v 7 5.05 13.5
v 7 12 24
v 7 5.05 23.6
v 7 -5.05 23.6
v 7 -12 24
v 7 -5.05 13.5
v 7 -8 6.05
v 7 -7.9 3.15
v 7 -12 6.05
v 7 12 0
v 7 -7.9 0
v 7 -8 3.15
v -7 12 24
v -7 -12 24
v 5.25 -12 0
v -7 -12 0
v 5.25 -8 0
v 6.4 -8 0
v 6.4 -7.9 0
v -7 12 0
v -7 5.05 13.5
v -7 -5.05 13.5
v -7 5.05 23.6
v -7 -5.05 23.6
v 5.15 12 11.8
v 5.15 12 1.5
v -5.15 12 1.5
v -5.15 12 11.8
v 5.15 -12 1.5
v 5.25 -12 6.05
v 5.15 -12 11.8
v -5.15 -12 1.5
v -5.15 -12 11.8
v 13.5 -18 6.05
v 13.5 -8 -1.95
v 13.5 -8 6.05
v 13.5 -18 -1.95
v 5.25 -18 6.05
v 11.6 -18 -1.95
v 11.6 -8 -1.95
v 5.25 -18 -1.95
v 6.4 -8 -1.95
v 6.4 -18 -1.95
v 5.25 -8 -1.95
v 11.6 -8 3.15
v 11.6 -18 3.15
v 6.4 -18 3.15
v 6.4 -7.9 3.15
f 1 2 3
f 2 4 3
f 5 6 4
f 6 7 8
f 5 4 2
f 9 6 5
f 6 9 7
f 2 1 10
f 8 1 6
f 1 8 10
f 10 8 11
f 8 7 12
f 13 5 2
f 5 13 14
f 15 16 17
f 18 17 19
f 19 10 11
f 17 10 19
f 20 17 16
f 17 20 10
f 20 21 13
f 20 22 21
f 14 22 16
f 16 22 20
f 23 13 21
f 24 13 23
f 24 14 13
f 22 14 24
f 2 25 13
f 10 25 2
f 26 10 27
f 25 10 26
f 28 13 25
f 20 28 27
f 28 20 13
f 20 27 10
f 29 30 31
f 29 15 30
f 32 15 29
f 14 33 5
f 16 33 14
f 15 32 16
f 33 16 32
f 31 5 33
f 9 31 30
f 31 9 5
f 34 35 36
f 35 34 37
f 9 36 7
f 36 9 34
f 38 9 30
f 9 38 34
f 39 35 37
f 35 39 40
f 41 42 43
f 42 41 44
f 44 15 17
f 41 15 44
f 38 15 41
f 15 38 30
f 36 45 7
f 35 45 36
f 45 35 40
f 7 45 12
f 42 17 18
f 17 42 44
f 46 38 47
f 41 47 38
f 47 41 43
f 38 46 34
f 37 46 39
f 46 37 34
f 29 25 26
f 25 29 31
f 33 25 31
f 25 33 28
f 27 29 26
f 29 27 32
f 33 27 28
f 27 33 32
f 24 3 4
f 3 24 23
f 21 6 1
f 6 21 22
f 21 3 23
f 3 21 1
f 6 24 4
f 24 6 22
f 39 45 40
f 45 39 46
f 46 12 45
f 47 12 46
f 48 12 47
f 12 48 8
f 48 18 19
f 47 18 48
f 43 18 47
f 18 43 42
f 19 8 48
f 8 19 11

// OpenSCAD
/* ==========================================================================
   PROJETO CAMPO TÁTIL - CARRINHO LATERAL Y (SLIDER ESTREITO DE 14mm)
   Gera peças individuais Esquerda ou Direita para fatiamento (Bambu Lab)
   Suportes da cremalheira X estreitados para 8.25mm (Evita colisão com o eixo Y)
   ========================================================================== */

/* [Tipo de Peça] */
// Selecione se deseja gerar o carrinho esquerdo ou o direito
tipo_carrinho = "esquerdo"; // [esquerdo: Carrinho Esquerdo, direito: Carrinho Direito]

$fn = 60;

module carrinho_lateral_y(braco_interno_esquerdo=true) {
    // desloc_x_suporte do pocket vai para 9.0mm relativo
    // desloc_x_centro_braco vai para 9.375mm relativo (médio de 5.25 e 13.5)
    desloc_x_suporte = braco_interno_esquerdo ? 9.0 : -9.0;
    desloc_x_centro_braco = braco_interno_esquerdo ? 9.375 : -9.375;
    
    difference() {
        union() {
            // Corpo principal original de 24mm em Y
            translate([0, 0, 12]) 
                cube([14, 24, 24], center=true);
            
            // Prolongador interno rebaixado em Z (Largura reduzida para 8.25mm, folga do eixo Y)
            translate([desloc_x_centro_braco, -13.0, 0.55 + 1.5])
                cube([8.25, 10, 8.0], center=true);
        }
        
        // Canal passante interno para o eixo quadrado Y (10.3mm - Spans X = -5.15 a 5.15)
        translate([0, 0, 1.5 + 10.3/2]) 
            cube([10.3, 26, 10.3], center=true);
            
        // Eixo Único da Ponte X (Y = 0mm)
        translate([0, 0, 13.5 + 10.1/2]) 
            cube([16, 10.1, 10.1], center=true);
        
        // Bolsa fêmea de 5.0mm (Vai de ±66.0mm a ±71.0mm absoluto)
        translate([desloc_x_suporte, -13.0, 0.55])
            cube([5.2, 10.2, 5.2], center=true);
    }
}

// RENDERIZAR A PEÇA ESCOLHIDA NO CENTRO DE IMPRESSÃO
if (tipo_carrinho == "esquerdo") {
    carrinho_lateral_y(braco_interno_esquerdo=true);
} else {
    carrinho_lateral_y(braco_interno_esquerdo=false);
}
